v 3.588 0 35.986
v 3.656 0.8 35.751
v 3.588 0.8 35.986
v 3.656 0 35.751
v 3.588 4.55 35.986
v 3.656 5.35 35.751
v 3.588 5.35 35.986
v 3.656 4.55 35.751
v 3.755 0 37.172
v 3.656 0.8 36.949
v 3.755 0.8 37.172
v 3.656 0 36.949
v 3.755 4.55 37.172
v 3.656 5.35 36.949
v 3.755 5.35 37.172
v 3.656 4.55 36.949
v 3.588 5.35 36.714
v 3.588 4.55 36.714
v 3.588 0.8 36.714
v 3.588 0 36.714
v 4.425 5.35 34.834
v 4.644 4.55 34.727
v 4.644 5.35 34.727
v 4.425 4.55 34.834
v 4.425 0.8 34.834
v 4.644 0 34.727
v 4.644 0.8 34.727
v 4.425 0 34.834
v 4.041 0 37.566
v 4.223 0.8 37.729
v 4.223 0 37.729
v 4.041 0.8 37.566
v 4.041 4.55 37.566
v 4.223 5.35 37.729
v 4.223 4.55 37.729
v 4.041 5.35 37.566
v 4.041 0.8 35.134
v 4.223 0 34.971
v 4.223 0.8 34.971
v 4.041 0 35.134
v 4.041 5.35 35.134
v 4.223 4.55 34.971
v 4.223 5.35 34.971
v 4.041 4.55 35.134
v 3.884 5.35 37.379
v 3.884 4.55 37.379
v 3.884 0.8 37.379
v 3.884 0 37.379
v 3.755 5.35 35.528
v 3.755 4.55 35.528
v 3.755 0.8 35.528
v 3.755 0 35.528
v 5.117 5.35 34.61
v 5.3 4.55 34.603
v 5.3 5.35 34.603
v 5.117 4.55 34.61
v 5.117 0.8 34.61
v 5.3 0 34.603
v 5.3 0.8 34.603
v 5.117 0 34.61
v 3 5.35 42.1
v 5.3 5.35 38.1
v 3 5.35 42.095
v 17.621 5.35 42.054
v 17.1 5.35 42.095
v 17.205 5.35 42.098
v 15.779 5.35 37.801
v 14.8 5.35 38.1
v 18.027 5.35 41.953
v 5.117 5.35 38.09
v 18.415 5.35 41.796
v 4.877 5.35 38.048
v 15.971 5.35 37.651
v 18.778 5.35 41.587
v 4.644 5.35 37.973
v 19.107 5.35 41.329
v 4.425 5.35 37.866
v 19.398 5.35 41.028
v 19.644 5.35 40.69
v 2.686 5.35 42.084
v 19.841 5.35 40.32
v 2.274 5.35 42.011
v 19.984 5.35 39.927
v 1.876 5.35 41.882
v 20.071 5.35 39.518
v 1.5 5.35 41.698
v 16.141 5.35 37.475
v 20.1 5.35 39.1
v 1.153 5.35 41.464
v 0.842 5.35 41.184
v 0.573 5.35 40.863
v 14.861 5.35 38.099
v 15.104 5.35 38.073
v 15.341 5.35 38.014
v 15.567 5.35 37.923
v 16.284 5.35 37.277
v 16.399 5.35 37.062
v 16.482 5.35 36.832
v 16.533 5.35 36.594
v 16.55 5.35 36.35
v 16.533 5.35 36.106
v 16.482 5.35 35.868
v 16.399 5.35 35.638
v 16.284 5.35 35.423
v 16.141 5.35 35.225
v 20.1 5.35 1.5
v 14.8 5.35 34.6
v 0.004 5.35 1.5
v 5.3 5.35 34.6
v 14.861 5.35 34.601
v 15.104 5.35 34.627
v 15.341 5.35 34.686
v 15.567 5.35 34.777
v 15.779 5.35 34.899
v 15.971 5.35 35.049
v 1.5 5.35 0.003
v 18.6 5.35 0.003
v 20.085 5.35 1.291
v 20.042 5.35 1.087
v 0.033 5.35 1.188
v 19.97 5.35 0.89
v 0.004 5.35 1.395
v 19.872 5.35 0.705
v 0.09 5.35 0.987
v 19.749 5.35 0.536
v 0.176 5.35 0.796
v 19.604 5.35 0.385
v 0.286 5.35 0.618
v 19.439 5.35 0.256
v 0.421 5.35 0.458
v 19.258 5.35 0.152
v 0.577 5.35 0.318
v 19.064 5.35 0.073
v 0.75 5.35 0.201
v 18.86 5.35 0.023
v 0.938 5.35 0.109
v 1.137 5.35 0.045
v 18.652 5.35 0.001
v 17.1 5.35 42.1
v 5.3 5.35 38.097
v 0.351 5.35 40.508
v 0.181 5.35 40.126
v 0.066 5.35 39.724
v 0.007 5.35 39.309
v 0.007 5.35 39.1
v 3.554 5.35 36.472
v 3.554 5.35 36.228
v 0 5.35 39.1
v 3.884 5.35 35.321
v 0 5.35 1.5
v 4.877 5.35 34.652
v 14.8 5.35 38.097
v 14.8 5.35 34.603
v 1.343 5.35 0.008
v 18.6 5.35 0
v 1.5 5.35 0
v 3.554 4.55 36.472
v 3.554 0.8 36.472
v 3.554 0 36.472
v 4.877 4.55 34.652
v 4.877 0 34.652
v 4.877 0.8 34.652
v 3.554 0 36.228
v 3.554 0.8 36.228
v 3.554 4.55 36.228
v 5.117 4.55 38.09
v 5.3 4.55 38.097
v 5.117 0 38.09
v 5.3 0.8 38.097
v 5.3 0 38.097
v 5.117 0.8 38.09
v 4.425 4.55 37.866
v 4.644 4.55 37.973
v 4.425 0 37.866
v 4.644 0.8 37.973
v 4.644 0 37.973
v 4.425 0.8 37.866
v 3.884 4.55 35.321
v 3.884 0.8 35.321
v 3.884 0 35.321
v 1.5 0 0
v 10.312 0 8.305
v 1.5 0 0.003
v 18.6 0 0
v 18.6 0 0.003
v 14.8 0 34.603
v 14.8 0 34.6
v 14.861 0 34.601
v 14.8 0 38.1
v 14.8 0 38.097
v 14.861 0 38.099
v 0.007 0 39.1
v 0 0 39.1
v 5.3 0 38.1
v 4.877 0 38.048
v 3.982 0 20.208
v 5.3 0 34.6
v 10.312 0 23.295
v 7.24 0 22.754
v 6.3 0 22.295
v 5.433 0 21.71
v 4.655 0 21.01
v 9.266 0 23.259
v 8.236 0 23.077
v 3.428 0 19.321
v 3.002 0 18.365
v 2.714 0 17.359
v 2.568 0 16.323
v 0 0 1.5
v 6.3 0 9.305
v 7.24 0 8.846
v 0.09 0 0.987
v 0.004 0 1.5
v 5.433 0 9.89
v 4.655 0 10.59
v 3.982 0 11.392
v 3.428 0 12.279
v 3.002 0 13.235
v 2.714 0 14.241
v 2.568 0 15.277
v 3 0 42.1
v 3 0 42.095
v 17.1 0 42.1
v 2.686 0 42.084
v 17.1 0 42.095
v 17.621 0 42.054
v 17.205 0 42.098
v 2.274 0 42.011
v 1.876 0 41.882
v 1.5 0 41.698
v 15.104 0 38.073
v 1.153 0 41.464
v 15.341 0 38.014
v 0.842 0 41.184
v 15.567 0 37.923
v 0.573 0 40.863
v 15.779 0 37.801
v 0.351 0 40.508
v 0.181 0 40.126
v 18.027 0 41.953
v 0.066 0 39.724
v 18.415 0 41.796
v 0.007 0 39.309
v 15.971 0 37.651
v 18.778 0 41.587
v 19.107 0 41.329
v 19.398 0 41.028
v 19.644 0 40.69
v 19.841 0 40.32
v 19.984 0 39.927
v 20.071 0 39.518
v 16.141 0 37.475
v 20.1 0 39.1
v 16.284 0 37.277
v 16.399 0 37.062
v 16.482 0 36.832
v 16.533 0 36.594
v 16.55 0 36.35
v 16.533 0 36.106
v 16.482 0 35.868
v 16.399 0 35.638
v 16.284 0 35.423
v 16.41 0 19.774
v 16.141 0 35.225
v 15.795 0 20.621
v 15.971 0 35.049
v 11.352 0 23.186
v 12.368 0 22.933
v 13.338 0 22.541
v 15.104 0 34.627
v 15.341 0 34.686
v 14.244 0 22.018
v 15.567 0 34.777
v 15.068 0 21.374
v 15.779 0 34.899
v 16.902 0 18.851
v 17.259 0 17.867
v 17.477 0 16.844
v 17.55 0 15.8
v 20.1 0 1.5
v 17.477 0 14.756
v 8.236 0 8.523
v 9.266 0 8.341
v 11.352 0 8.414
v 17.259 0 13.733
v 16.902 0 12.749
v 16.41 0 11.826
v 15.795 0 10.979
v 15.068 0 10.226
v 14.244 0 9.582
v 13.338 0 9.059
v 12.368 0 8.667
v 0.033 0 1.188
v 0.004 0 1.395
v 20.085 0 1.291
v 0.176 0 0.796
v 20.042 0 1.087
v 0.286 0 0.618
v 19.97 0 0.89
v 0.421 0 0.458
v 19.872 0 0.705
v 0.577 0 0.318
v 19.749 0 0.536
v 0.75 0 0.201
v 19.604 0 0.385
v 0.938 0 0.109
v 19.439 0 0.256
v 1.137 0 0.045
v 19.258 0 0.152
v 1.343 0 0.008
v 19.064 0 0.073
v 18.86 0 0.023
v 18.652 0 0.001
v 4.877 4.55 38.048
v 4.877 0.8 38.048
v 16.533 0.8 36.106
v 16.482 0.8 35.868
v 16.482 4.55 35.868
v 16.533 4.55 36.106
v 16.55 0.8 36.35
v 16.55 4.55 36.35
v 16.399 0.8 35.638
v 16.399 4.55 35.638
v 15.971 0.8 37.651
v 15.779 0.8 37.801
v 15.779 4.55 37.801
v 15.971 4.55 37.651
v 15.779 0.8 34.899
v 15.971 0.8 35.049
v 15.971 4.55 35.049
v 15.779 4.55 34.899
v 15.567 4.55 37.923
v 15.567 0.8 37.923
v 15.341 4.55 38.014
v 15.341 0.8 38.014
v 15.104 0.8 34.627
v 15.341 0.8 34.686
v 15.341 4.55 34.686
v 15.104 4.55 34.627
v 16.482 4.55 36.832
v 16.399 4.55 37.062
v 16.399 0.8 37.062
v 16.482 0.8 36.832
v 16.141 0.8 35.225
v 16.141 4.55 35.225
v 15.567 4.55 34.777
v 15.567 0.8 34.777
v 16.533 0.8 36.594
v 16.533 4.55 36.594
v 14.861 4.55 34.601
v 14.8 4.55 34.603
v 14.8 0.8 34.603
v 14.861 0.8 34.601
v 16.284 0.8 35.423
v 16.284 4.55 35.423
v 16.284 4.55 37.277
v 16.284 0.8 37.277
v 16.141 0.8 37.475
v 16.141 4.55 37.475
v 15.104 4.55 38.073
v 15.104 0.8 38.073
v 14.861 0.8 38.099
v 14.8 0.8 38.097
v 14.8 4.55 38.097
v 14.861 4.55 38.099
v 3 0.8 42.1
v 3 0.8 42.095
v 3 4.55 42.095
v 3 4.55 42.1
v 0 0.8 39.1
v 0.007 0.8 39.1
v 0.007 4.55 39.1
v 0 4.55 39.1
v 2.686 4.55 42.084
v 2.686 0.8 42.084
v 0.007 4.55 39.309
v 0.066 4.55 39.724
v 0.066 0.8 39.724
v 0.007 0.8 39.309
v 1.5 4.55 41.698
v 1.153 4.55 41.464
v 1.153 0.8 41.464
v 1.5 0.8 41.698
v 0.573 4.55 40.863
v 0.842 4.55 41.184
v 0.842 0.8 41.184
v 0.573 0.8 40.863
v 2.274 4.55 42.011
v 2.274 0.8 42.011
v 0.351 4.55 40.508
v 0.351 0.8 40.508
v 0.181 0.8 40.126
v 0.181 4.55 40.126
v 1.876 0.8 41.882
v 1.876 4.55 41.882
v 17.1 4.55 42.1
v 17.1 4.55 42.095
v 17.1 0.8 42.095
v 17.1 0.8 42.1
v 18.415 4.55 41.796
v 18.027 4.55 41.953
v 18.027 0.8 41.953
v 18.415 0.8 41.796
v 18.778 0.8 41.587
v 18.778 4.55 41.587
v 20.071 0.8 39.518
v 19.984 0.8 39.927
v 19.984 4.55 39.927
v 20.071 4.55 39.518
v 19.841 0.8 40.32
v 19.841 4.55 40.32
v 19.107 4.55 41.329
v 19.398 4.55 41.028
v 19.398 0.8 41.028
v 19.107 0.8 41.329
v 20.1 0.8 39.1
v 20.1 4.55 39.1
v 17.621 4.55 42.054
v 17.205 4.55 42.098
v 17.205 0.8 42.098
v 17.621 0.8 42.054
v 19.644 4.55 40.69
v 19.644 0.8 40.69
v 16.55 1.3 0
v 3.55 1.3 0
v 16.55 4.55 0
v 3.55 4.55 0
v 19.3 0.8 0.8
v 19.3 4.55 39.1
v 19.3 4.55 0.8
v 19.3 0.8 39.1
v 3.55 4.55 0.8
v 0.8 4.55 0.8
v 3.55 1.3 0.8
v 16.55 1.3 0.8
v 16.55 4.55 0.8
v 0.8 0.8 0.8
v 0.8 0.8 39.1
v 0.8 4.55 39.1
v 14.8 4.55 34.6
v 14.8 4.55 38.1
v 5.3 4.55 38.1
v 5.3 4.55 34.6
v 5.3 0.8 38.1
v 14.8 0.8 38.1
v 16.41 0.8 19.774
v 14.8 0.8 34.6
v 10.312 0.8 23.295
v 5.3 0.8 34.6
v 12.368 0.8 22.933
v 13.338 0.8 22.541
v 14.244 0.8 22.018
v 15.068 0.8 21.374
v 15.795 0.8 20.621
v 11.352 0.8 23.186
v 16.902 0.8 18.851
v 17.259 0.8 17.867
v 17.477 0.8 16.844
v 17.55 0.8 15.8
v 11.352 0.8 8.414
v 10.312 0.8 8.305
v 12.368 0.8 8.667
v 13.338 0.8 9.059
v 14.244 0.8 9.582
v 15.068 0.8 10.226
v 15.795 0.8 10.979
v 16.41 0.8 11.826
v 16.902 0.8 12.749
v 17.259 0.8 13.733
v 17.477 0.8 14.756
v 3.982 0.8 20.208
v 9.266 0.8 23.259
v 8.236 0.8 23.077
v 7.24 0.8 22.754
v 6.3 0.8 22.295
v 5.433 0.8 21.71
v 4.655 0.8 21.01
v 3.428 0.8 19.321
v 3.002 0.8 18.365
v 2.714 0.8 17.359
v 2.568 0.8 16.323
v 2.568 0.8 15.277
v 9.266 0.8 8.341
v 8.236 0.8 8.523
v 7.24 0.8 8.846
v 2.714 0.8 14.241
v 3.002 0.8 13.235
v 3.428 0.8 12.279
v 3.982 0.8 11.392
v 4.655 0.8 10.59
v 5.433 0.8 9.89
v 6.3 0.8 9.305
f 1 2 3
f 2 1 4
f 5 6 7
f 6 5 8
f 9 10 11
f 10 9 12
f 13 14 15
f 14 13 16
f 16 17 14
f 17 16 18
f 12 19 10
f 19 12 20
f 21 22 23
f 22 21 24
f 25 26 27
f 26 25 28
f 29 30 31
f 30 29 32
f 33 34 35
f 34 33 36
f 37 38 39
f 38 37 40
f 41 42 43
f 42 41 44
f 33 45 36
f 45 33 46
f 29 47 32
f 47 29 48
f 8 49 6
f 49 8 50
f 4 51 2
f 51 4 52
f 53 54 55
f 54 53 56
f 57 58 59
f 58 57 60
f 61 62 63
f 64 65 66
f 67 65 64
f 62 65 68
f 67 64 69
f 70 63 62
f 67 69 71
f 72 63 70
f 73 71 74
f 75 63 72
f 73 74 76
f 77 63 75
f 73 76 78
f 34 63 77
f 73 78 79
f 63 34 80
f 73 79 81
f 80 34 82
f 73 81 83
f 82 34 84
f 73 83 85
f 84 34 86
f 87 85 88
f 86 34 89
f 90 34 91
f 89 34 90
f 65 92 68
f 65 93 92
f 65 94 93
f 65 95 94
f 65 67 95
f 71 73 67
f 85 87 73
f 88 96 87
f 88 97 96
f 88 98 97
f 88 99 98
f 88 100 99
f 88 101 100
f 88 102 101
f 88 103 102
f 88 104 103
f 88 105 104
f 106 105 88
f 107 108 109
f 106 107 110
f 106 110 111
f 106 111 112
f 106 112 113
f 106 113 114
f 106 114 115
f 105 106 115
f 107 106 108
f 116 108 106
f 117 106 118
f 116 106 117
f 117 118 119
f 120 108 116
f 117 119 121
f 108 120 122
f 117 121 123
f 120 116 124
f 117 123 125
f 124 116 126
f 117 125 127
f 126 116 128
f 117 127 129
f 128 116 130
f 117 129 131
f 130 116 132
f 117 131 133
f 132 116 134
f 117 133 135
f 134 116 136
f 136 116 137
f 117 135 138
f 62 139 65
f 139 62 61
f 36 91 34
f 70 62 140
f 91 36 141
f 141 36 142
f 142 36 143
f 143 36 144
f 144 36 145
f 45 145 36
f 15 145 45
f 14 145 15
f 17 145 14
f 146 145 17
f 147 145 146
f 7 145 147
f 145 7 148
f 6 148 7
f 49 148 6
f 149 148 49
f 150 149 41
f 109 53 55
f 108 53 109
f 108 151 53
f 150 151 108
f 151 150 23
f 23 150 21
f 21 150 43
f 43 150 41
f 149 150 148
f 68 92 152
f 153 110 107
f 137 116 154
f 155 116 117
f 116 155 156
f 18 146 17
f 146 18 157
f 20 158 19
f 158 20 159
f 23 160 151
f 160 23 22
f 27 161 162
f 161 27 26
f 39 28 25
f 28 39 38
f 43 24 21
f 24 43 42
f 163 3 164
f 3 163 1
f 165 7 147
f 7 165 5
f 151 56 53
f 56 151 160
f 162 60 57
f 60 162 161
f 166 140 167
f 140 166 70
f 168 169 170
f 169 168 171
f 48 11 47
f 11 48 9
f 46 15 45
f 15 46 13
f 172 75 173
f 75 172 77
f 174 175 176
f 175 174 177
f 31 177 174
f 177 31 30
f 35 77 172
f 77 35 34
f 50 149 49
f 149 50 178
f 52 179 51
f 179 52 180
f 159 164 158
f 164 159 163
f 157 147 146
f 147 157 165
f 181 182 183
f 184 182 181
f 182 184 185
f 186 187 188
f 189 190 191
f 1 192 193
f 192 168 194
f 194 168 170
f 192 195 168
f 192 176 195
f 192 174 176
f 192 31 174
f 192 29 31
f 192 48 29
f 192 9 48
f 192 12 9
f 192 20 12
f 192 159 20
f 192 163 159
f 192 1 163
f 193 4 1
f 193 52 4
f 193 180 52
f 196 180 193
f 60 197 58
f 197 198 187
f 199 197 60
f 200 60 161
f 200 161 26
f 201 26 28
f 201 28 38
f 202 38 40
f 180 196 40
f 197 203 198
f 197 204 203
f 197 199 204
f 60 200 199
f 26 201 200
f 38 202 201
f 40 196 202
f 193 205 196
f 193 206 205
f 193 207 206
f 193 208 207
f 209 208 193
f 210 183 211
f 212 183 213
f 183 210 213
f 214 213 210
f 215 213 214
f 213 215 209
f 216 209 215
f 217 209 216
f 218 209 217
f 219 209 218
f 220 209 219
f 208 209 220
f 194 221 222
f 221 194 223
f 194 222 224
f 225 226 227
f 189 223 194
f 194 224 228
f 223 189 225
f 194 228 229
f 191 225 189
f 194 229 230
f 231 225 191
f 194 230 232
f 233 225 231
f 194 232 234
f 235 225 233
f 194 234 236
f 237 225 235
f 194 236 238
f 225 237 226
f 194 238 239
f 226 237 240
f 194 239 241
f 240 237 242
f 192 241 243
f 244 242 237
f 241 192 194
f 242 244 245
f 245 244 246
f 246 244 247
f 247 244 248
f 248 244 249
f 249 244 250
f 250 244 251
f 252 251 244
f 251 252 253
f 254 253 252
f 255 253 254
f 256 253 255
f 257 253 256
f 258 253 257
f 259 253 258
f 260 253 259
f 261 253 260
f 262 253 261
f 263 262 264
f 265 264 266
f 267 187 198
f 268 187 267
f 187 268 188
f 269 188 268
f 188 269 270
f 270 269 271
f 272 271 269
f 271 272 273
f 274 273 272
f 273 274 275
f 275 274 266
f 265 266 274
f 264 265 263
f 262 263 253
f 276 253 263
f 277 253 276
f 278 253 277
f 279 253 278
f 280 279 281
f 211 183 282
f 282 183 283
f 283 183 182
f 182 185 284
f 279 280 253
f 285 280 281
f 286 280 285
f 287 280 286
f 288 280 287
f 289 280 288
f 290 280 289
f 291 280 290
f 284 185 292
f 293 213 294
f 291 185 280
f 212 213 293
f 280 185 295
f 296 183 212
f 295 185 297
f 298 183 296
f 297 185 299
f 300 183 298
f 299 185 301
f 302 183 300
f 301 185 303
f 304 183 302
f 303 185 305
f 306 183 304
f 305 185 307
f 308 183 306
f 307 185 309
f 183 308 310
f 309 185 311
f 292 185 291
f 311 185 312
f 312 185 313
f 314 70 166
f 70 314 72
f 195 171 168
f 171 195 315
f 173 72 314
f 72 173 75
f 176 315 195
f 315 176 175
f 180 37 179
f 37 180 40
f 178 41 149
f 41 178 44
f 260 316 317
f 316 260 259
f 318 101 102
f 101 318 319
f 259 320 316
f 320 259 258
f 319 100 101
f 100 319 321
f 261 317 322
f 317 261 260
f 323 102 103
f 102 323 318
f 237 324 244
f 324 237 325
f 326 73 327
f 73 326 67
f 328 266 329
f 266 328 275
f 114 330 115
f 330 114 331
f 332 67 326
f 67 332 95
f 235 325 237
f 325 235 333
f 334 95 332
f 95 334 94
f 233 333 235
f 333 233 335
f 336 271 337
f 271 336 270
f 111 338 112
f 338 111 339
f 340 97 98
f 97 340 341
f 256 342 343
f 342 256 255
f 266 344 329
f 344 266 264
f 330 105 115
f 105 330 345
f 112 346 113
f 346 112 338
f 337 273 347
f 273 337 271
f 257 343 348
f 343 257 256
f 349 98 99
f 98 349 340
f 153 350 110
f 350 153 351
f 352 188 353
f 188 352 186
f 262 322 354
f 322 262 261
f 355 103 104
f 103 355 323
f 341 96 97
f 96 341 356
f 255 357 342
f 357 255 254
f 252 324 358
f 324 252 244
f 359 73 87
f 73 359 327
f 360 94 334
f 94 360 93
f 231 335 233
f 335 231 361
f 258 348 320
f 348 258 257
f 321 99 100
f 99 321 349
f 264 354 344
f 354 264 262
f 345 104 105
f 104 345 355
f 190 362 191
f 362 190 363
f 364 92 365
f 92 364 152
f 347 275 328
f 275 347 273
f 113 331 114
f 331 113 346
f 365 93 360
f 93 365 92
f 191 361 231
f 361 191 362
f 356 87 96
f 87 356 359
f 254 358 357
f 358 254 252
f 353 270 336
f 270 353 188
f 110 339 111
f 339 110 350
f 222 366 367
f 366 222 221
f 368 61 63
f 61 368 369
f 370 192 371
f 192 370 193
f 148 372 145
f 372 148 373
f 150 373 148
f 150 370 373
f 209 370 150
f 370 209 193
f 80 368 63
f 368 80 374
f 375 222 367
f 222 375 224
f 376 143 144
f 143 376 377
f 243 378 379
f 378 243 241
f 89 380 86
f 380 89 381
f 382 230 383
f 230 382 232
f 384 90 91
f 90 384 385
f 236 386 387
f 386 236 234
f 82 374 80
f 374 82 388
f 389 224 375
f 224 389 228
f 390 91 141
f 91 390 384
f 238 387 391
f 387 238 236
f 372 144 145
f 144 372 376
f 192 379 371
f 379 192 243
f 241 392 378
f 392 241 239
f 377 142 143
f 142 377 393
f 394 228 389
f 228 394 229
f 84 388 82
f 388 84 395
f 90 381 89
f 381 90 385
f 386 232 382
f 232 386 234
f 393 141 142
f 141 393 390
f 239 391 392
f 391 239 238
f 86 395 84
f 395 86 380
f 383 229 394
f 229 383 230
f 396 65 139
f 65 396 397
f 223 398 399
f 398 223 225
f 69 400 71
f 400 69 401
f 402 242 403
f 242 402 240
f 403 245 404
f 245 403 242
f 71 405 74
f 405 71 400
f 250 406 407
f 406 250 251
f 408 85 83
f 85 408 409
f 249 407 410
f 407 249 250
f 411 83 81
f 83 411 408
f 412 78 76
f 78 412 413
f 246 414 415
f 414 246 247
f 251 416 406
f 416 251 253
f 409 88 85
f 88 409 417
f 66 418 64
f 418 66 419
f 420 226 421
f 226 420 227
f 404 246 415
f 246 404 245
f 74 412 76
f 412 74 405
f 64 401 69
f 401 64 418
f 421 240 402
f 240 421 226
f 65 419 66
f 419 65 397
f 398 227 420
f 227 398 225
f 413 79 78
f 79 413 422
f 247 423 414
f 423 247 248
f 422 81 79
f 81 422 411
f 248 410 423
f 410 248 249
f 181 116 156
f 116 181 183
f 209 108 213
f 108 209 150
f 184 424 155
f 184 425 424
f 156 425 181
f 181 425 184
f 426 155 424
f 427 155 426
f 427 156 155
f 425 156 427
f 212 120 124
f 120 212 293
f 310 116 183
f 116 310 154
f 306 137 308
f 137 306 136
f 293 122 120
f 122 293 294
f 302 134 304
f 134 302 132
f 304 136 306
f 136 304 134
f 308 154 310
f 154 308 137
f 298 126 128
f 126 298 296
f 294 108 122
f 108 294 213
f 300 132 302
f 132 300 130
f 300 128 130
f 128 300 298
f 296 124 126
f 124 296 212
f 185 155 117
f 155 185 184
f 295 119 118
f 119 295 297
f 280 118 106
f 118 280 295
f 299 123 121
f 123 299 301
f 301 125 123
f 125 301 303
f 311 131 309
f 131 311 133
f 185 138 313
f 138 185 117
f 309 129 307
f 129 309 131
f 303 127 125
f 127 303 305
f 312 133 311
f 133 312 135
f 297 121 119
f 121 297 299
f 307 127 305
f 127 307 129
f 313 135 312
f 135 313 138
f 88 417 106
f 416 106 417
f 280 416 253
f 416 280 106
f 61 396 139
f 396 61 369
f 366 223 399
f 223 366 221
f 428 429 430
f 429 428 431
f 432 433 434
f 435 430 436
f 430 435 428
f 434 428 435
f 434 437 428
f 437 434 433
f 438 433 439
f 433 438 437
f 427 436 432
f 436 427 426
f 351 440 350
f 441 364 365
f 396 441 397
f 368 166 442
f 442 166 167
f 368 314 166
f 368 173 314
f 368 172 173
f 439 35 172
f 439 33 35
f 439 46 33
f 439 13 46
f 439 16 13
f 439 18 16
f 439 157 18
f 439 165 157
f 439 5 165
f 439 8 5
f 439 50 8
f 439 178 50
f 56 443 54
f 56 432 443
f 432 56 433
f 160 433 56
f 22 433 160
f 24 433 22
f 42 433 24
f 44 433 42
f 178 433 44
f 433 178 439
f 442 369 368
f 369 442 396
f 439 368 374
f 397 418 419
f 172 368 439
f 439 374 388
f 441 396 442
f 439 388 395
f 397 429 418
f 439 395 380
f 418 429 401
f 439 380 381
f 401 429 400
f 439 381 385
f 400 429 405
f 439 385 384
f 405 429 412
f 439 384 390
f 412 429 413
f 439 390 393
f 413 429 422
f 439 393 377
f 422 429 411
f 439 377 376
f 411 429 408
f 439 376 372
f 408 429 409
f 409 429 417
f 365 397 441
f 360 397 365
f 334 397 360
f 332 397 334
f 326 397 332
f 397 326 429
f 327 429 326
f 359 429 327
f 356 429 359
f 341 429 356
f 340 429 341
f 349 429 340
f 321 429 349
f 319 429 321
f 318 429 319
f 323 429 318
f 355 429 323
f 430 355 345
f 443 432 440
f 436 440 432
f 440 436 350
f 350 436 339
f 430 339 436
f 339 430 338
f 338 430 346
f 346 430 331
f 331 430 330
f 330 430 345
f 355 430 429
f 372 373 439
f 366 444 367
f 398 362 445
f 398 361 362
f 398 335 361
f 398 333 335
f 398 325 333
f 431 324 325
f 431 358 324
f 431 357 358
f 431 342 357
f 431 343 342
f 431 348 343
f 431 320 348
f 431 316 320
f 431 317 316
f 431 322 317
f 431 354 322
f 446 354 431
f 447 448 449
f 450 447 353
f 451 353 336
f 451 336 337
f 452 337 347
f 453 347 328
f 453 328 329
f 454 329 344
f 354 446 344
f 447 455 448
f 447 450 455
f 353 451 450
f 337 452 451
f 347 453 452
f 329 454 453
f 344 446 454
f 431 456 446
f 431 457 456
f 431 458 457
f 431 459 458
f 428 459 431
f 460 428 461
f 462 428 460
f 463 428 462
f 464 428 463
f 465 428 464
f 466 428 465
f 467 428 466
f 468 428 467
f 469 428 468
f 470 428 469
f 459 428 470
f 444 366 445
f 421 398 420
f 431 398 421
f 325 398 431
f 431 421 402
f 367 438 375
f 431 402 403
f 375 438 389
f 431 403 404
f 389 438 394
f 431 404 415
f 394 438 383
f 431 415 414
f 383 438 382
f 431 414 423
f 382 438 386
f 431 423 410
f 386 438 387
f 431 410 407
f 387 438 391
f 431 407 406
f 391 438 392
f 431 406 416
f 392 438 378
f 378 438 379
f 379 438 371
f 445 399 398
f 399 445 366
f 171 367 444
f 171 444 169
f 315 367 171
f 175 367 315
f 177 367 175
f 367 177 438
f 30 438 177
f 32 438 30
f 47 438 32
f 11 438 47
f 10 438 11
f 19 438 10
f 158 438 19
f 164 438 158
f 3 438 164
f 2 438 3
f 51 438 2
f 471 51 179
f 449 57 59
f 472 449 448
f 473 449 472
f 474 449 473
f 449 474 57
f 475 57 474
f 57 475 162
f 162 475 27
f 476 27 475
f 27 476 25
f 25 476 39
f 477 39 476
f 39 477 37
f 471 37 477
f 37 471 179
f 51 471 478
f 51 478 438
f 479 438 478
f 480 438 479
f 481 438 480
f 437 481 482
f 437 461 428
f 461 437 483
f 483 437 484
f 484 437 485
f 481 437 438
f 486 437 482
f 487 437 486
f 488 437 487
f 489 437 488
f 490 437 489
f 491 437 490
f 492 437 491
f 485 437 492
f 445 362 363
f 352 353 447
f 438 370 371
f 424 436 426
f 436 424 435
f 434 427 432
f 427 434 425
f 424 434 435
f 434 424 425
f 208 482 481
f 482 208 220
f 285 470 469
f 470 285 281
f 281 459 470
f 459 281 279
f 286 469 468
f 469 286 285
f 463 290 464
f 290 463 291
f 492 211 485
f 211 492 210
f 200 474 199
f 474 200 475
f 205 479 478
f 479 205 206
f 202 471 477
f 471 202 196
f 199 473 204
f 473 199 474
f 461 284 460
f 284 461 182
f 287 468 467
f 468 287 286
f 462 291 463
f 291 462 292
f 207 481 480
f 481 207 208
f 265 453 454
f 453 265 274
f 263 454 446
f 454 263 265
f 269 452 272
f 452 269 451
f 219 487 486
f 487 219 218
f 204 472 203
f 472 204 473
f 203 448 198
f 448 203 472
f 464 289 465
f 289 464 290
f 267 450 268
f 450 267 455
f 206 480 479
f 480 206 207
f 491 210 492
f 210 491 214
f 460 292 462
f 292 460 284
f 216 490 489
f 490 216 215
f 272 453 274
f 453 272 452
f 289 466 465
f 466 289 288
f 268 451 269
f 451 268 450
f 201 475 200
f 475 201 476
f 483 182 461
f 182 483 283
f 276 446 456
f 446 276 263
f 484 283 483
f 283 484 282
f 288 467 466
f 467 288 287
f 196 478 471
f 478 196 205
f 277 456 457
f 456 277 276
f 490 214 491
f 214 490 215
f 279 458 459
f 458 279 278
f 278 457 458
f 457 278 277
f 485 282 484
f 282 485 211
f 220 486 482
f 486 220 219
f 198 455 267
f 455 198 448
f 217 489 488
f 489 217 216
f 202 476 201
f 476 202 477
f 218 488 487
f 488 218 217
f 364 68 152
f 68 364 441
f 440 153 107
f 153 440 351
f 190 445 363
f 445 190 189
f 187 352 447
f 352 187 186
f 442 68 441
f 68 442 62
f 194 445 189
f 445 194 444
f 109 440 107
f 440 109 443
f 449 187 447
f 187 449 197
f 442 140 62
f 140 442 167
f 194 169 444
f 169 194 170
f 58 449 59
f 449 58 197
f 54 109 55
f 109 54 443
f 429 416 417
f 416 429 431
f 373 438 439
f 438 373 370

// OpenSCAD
// A case for a yubikey.

// TODO - my first print of this broke at the badge-holder-hole, don't trust
// this thing to not lose your yubikey.

width = 18.5;
length = 33.8;
thickness = 3.75;
plug_thickness = (thickness - 0.5);
head_width = 13;

button_height = 15;
button_hole_diameter = 15;

key_margin = 0;
key_hole_dia = 3.5;
key_hole_width = 13;
top_margin = 4;

top_fillet_radius = 3;
bottom_fillet_radius = 1.5;
part_thickness = 0.8;



center_y = ((width / 2) + part_thickness);

difference() {
    cube([
        width + 2 * part_thickness,
        thickness + 2 * part_thickness,
        length + part_thickness + key_margin + key_hole_dia + top_margin
    ]);
    // main opening
    translate([part_thickness, part_thickness, part_thickness]) {
        cube([width, thickness, length + part_thickness + 20]);
    }
    // plug opening
    translate([center_y - (head_width / 2), part_thickness + (thickness - plug_thickness), 0]) {
        cube([head_width, plug_thickness, 10]);
    }
    // button hole
    translate([center_y, 0, part_thickness + button_height]) {
        rotate([-90, 0, 0]) {
            cylinder(h=part_thickness, d=button_hole_diameter, $fn=45);
        }
    }
    // keyring hole
    for(i = [-1, 1]) {
        translate([
            center_y + (i * (key_hole_width-key_hole_dia) / 2),
            0,
            length + part_thickness + key_hole_dia / 2 + key_margin
        ]) {
            rotate([-90, 0, 0]) {
                cylinder(h=2 * part_thickness + thickness, d=key_hole_dia, $fn=45);
            }
        }
    }
    translate([((width-key_hole_width+key_hole_dia)/2+part_thickness), 0, length + part_thickness + key_margin]) {
        cube([key_hole_width - key_hole_dia, 2 * part_thickness + thickness, key_hole_dia]);
    }
    // top fillet left
    translate([0, 0, length + part_thickness + key_margin + key_hole_dia + top_margin - top_fillet_radius]) {
        difference() {
            cube([top_fillet_radius, (2 * part_thickness) + thickness, top_fillet_radius]);
            translate([top_fillet_radius, 0, 0]) {
                rotate([-90, 0, 0]) {
                    cylinder(r=top_fillet_radius, h=(2 * part_thickness) + thickness, $fn=45);
                }
            }
        }
    }
    // top fillet right
    translate([
        (2 * part_thickness) + width - top_fillet_radius,
        0,
        length + part_thickness + key_margin + key_hole_dia + top_margin - top_fillet_radius
    ]) {
        difference() {
            cube([top_fillet_radius, (2 * part_thickness) + thickness, top_fillet_radius]);
            rotate([-90, 0, 0]) {
                cylinder(r=top_fillet_radius, h=(2 * part_thickness) + thickness, $fn=45);
            }
        }
    }
    // top fillet slot
    translate([
        0,
        part_thickness,
        length + part_thickness + key_margin + key_hole_dia + top_margin - top_fillet_radius
    ]) {
        cube([
            width + 2*part_thickness,
            thickness, 
            top_fillet_radius
        ]);
    }
    // bottom fillet left
    translate([0, 0, 0]) {
        difference() {
            cube([bottom_fillet_radius, (2 * part_thickness) + thickness, bottom_fillet_radius]);
            translate([bottom_fillet_radius, 0, bottom_fillet_radius]) {
                rotate([-90, 0, 0]) {
                    cylinder(r=bottom_fillet_radius, h=(2 * part_thickness) + thickness, $fn=45);
                }
            }
        }
    }
    // bottom fillet right
    translate([(2 * part_thickness) + width - bottom_fillet_radius, 0, 0]) {
        difference() {
            cube([bottom_fillet_radius, (2 * part_thickness) + thickness, bottom_fillet_radius]);
            translate([0, 0, bottom_fillet_radius]) {
                rotate([-90, 0, 0]) {
                    cylinder(r=bottom_fillet_radius, h=(2 * part_thickness) + thickness, $fn=45);
                }
            }
        }
    }
}
